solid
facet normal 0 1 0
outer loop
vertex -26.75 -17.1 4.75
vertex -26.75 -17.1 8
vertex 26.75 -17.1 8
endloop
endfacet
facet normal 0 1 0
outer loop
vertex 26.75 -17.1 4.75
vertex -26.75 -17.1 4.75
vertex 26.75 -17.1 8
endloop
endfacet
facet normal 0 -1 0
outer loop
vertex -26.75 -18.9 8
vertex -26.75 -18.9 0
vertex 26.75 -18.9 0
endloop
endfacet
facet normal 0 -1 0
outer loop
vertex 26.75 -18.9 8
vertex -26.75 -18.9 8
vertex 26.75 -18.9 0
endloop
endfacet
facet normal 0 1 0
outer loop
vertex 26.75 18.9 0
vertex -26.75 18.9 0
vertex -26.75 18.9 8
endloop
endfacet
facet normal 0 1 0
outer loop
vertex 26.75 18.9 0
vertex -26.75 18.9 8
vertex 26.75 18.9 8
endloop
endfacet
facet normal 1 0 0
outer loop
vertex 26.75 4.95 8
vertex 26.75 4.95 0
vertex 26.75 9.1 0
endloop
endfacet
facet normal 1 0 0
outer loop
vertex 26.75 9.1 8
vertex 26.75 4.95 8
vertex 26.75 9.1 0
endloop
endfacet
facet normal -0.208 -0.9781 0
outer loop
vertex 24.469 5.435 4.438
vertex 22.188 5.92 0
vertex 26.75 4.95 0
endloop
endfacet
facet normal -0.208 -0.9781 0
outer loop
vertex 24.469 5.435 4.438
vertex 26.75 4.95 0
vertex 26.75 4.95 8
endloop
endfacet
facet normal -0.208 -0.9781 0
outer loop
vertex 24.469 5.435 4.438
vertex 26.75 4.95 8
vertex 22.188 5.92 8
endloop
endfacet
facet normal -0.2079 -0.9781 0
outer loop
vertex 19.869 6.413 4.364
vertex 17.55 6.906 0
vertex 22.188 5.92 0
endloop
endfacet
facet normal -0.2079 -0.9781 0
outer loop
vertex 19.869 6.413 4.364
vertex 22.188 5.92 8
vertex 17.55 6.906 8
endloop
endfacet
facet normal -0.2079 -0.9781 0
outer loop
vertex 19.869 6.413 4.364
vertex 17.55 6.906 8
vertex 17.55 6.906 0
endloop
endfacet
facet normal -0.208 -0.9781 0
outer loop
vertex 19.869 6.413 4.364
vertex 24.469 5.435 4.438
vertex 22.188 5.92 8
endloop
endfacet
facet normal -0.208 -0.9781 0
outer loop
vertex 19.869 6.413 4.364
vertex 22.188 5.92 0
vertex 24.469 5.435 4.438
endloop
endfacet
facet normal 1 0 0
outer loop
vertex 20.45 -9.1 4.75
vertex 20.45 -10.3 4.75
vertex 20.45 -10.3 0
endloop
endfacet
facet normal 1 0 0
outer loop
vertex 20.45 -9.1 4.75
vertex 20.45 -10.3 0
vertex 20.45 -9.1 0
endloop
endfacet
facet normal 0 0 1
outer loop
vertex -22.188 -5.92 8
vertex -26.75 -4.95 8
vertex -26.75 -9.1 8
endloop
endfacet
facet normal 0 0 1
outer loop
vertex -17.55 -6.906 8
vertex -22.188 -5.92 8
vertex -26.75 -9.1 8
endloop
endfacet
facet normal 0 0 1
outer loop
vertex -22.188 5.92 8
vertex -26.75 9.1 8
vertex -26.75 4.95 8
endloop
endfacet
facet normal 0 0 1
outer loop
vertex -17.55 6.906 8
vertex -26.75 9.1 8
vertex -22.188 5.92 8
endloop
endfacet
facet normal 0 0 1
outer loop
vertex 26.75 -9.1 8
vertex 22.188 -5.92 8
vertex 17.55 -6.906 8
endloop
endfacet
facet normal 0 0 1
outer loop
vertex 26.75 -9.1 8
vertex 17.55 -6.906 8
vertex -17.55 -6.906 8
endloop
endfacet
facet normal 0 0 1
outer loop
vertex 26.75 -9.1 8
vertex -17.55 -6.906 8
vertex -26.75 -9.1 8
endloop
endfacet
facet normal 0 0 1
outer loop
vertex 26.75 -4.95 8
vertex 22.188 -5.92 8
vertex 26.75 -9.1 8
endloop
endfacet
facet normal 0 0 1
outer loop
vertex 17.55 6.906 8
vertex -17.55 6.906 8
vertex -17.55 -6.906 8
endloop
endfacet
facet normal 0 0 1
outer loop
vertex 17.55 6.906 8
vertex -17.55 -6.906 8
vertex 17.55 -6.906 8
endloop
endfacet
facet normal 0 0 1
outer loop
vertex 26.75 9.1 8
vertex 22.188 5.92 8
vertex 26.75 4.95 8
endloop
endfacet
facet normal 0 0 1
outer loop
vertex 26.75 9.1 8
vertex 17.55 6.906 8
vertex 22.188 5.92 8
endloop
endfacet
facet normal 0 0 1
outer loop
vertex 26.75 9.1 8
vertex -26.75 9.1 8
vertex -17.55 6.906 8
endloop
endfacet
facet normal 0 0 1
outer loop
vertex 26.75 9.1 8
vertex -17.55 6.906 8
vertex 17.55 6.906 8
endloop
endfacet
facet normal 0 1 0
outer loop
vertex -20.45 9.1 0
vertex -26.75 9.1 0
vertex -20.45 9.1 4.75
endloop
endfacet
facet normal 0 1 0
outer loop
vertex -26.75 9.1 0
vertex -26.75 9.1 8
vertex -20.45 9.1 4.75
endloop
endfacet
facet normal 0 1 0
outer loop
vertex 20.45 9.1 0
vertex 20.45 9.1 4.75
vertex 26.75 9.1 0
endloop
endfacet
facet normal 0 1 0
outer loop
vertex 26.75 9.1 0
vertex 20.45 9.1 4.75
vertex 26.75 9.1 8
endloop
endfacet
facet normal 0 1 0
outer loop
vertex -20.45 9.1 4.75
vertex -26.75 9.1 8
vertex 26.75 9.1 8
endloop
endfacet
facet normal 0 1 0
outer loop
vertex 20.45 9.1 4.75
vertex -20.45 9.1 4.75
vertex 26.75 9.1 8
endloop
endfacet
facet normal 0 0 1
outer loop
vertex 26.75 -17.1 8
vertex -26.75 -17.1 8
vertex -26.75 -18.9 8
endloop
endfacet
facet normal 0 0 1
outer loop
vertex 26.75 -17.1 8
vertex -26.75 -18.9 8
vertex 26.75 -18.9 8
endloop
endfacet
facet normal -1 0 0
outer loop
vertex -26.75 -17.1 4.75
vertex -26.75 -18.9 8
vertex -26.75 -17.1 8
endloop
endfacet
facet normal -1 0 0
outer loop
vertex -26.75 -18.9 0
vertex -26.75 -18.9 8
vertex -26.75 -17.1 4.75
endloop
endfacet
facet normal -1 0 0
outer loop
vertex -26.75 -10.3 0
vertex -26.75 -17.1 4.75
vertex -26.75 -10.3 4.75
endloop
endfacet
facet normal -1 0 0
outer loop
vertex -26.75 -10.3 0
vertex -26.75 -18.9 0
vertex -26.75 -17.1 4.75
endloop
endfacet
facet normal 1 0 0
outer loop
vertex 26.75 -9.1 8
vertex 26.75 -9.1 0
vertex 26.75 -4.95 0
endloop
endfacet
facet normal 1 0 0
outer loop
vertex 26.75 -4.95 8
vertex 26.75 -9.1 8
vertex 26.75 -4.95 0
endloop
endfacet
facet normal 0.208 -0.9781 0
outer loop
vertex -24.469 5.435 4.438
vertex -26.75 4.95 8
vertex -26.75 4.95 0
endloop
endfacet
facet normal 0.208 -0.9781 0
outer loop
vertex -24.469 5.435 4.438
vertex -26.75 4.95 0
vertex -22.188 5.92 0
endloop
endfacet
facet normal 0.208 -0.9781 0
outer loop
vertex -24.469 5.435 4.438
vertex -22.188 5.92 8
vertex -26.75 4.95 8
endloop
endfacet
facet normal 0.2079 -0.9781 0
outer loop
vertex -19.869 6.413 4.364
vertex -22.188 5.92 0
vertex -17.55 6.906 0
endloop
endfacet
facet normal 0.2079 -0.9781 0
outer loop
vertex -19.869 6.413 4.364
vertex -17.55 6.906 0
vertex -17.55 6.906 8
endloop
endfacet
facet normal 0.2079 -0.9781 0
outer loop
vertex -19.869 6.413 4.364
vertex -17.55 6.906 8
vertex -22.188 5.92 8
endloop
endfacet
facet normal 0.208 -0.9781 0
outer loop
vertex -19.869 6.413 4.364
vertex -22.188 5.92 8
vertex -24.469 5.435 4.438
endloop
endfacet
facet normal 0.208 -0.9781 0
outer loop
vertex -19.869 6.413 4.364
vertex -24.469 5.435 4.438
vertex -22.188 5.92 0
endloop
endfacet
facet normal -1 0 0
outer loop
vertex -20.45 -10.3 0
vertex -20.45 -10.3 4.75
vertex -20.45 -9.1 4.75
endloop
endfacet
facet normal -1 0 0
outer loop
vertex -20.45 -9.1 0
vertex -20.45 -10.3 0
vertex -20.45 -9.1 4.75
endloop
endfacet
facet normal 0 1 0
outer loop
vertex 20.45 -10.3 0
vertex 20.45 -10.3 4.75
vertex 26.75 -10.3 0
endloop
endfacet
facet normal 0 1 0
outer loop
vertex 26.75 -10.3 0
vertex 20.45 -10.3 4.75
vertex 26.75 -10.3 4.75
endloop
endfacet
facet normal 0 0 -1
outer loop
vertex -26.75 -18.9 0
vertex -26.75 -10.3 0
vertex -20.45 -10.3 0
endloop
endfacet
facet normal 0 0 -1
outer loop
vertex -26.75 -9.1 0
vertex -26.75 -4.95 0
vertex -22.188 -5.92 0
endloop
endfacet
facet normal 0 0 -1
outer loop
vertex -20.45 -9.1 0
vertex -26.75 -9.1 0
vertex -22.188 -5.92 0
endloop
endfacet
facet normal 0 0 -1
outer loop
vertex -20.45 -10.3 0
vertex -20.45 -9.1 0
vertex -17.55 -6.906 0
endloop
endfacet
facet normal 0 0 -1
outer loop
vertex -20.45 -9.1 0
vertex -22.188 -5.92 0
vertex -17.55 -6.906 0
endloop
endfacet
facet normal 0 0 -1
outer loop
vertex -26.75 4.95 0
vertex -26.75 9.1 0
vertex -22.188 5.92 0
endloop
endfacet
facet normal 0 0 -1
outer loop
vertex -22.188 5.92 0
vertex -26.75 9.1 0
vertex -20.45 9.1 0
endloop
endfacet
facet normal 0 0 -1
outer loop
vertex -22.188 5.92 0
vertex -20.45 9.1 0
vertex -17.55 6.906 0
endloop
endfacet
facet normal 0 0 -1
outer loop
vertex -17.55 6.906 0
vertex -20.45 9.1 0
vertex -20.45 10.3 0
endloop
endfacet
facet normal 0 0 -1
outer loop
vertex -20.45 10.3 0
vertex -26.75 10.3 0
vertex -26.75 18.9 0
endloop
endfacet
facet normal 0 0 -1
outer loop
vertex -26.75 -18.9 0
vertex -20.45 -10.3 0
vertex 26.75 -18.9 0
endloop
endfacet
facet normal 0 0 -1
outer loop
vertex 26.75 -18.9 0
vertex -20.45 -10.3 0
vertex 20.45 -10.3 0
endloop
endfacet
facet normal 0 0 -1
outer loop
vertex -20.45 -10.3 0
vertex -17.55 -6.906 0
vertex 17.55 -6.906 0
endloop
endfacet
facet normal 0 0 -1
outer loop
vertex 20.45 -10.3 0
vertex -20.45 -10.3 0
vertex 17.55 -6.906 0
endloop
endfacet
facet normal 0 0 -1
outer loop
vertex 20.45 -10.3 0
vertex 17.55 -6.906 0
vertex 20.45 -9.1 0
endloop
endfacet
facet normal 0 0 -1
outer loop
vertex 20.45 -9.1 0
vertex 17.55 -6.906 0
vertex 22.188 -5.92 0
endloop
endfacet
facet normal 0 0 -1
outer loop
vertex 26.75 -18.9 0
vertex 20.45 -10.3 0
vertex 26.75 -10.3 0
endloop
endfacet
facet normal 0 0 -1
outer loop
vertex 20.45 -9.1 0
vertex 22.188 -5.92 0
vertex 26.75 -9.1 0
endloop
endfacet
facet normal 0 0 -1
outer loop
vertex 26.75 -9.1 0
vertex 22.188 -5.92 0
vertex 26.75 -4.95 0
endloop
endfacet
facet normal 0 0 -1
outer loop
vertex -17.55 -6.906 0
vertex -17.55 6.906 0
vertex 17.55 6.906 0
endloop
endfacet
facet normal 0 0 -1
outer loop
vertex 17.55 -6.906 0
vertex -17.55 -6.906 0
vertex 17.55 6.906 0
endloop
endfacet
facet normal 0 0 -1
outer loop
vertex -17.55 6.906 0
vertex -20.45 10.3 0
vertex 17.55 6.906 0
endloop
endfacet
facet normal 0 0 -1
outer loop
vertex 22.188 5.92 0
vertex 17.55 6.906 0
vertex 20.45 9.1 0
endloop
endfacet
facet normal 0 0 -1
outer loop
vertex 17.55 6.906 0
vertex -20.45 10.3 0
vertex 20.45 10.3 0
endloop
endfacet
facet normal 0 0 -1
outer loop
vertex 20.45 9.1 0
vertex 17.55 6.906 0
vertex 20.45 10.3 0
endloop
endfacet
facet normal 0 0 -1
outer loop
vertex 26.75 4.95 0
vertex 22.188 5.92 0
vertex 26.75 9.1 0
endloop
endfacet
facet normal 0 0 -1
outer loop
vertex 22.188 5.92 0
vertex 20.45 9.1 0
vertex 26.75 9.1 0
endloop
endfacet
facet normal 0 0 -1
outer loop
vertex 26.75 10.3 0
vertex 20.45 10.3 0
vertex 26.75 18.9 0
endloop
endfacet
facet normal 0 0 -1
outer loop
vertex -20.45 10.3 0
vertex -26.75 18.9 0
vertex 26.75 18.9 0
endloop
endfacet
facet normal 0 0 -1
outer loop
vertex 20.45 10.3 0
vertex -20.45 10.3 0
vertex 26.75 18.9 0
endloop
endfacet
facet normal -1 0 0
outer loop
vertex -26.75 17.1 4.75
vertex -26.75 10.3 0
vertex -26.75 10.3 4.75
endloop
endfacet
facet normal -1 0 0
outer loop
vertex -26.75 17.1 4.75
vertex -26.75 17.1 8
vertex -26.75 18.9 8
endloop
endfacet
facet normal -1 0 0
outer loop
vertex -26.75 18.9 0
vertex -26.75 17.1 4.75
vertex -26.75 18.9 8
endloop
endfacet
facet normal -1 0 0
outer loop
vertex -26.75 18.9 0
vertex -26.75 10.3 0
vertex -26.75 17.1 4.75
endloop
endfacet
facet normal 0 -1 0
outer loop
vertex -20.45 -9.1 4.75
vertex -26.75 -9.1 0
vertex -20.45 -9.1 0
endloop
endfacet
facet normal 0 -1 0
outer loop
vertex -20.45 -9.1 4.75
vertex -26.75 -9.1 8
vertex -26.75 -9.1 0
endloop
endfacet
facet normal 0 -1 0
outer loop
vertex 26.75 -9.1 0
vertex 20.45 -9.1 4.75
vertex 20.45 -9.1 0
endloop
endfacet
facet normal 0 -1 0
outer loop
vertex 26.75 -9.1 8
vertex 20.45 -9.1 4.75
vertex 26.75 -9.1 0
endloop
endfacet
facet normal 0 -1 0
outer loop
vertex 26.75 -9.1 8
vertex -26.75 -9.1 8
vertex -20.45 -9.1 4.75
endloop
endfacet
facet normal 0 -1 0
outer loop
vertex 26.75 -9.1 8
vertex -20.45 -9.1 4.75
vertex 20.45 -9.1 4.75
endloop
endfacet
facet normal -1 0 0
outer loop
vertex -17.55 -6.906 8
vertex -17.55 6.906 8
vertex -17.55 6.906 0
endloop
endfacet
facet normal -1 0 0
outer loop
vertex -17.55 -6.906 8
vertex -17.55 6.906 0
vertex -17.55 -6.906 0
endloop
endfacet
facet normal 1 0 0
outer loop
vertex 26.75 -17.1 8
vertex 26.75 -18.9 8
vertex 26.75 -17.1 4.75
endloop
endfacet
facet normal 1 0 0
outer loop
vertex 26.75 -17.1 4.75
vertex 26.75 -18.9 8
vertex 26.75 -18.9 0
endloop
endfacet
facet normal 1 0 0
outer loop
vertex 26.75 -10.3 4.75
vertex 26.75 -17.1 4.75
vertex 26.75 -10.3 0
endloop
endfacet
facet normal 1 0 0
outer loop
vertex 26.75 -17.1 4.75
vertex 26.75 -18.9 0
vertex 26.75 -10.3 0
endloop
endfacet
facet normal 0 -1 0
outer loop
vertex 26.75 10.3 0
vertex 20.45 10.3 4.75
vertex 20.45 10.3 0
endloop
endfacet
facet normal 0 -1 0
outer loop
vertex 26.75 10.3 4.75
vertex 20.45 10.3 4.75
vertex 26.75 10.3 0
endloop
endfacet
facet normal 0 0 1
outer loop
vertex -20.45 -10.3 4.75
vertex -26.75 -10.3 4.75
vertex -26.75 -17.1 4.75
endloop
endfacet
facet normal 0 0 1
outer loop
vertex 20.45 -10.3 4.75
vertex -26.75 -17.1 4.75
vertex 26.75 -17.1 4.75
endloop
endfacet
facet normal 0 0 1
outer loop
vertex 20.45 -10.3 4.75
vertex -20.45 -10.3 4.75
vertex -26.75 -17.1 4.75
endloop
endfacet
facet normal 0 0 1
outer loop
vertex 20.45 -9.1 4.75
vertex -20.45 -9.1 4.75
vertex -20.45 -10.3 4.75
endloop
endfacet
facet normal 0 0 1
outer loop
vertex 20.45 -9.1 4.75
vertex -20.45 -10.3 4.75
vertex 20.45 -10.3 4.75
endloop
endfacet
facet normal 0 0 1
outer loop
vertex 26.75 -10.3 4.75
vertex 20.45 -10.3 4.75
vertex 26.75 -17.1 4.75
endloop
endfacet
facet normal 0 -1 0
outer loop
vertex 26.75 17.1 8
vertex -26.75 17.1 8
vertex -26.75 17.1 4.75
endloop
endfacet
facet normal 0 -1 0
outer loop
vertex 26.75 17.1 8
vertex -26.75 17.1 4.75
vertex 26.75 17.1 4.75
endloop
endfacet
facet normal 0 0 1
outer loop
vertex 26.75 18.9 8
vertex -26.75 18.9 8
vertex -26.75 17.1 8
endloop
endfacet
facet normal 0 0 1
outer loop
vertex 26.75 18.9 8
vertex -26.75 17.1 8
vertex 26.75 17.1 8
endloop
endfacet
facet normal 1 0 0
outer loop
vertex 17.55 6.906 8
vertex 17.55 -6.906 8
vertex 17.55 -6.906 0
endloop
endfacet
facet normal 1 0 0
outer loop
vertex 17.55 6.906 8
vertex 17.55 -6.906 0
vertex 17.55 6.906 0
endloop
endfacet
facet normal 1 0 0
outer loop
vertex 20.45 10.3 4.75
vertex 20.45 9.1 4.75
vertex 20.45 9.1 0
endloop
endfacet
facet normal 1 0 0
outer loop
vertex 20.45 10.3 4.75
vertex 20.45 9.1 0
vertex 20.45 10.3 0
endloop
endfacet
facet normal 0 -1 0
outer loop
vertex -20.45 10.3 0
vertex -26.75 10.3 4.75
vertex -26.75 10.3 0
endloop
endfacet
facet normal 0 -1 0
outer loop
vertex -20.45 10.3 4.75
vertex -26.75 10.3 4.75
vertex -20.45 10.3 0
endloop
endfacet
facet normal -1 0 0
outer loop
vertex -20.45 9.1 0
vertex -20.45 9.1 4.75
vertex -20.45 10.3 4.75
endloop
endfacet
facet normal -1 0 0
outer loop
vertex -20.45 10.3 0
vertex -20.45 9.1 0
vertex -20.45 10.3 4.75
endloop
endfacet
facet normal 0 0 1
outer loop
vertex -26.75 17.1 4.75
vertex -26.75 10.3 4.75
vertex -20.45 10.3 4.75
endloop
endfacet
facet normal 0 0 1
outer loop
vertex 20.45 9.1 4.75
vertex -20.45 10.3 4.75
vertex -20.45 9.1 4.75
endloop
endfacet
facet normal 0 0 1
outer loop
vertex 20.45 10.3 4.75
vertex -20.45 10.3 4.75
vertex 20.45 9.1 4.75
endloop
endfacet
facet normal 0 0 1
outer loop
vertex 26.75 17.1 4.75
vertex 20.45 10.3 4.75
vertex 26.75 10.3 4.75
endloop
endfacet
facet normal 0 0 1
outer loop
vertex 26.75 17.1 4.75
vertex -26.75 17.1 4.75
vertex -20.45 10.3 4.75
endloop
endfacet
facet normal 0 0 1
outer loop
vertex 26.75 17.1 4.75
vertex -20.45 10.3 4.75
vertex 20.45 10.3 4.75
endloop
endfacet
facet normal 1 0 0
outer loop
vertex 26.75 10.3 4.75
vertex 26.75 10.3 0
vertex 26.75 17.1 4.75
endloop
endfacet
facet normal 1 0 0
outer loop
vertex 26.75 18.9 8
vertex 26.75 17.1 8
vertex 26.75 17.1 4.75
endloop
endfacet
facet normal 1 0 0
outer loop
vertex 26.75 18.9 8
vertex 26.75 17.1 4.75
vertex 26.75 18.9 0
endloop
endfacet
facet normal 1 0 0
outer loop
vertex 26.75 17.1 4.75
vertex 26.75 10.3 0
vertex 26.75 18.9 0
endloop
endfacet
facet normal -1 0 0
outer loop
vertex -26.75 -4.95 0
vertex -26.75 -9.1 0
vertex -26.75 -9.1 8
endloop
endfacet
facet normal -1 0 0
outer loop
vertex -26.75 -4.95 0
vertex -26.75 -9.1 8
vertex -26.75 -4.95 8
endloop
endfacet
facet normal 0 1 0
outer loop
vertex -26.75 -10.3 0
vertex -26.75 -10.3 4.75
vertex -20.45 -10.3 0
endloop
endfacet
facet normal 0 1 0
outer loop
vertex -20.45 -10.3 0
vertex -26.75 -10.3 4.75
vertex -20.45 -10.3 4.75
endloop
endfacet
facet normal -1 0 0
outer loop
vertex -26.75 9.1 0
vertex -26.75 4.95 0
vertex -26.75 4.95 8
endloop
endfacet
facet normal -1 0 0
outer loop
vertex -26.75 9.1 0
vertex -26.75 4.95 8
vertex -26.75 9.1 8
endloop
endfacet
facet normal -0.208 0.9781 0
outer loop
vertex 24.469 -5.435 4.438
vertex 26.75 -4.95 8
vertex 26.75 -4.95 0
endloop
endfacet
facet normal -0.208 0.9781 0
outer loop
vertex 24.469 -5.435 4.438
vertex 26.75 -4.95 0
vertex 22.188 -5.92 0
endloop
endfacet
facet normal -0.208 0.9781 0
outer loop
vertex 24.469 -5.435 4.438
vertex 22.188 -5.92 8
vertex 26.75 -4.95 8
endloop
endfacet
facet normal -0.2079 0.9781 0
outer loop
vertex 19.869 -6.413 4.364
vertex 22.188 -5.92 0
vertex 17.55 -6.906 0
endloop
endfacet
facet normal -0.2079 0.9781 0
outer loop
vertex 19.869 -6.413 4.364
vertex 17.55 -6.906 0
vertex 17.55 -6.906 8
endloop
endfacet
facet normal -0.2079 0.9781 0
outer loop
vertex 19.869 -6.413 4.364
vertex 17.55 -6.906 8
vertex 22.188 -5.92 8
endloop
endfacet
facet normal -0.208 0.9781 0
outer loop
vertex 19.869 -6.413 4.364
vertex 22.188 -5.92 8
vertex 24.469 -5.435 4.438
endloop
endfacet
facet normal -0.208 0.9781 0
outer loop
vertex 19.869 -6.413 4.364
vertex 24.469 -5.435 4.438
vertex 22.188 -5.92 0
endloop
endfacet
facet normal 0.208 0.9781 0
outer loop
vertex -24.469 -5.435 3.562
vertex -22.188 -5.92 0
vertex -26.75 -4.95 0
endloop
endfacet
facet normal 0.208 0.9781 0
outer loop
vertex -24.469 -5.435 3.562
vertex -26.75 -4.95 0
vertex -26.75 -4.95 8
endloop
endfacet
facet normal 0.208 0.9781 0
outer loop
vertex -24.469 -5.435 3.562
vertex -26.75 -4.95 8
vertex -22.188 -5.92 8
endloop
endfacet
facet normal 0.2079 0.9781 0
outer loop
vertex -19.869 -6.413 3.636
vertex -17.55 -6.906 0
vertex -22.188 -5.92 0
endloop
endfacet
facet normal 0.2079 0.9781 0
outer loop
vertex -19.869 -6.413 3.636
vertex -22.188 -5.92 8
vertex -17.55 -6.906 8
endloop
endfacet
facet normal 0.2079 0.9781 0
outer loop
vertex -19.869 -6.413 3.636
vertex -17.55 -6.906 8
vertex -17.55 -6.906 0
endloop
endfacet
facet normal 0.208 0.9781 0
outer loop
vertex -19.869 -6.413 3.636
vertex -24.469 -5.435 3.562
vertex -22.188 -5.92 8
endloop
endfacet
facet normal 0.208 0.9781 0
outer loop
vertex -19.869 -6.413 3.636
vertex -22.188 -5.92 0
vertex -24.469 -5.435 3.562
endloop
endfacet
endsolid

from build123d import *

# Parameters (mm, degrees)
F0_W      = 53.5
F0_H      = 37.8
F1_DEPTH  = 8
F2_W      = 53.5
F2_H      = 8
F3_DEPTH  = 3.25
F4_W      = 9.9
F4_H      = 8
F5_DEPTH  = 9.2
F5_TAPER  = -12
F6_W      = 9.9
F6_H      = 8
F7_DEPTH  = 9.2
F7_TAPER  = -12
F9_W      = 6.3
F9_H      = 1.2
F8_W      = 6.3
F8_H      = 1.2
F10_DEPTH = 4.75


with BuildPart() as f1:
    # F0 (on Top) → F1 (new body)
    with BuildSketch(Plane.XY):
        Rectangle(F0_W, F0_H)
    extrude(amount=F1_DEPTH)

    # F2 (on face) → F3 (cut)
    with BuildSketch(Plane.XY.offset(8)):
        with Locations((0, -13.1)):
            Rectangle(F2_W, F2_H)
        with Locations((0, 13.1)):
            Rectangle(F2_W, F2_H)
    extrude(amount=-F3_DEPTH, mode=Mode.SUBTRACT)

    # F4 (on face) → F5 (cut)
    with BuildSketch(Plane(origin=(-26.75, 0, 0), x_dir=(0, -1, 0), z_dir=(-1, 0, 0))):
        with Locations((0, 4)):
            Rectangle(F4_W, F4_H)
    extrude(amount=-F5_DEPTH, taper=F5_TAPER, mode=Mode.SUBTRACT)

    # F6 (on face) → F7 (cut)
    with BuildSketch(Plane.YZ.offset(26.75)):
        with Locations((0, 4)):
            Rectangle(F6_W, F6_H)
    extrude(amount=-F7_DEPTH, taper=F7_TAPER, mode=Mode.SUBTRACT)

    # F9 (on face) + F8 (on face) → F10 (cut)
    with BuildSketch(Plane.XY.offset(4.75)):
        with Locations((23.6, 9.7)):
            Rectangle(F9_W, F9_H)
        with Locations((-23.6, 9.7)):
            Rectangle(F9_W, F9_H)
    with BuildSketch(Plane.XY.offset(4.75)):
        with Locations((-23.6, -9.7)):
            Rectangle(F8_W, F8_H)
        with Locations((23.6, -9.7)):
            Rectangle(F8_W, F8_H)
    extrude(amount=-F10_DEPTH, mode=Mode.SUBTRACT)


solid = f1.part
